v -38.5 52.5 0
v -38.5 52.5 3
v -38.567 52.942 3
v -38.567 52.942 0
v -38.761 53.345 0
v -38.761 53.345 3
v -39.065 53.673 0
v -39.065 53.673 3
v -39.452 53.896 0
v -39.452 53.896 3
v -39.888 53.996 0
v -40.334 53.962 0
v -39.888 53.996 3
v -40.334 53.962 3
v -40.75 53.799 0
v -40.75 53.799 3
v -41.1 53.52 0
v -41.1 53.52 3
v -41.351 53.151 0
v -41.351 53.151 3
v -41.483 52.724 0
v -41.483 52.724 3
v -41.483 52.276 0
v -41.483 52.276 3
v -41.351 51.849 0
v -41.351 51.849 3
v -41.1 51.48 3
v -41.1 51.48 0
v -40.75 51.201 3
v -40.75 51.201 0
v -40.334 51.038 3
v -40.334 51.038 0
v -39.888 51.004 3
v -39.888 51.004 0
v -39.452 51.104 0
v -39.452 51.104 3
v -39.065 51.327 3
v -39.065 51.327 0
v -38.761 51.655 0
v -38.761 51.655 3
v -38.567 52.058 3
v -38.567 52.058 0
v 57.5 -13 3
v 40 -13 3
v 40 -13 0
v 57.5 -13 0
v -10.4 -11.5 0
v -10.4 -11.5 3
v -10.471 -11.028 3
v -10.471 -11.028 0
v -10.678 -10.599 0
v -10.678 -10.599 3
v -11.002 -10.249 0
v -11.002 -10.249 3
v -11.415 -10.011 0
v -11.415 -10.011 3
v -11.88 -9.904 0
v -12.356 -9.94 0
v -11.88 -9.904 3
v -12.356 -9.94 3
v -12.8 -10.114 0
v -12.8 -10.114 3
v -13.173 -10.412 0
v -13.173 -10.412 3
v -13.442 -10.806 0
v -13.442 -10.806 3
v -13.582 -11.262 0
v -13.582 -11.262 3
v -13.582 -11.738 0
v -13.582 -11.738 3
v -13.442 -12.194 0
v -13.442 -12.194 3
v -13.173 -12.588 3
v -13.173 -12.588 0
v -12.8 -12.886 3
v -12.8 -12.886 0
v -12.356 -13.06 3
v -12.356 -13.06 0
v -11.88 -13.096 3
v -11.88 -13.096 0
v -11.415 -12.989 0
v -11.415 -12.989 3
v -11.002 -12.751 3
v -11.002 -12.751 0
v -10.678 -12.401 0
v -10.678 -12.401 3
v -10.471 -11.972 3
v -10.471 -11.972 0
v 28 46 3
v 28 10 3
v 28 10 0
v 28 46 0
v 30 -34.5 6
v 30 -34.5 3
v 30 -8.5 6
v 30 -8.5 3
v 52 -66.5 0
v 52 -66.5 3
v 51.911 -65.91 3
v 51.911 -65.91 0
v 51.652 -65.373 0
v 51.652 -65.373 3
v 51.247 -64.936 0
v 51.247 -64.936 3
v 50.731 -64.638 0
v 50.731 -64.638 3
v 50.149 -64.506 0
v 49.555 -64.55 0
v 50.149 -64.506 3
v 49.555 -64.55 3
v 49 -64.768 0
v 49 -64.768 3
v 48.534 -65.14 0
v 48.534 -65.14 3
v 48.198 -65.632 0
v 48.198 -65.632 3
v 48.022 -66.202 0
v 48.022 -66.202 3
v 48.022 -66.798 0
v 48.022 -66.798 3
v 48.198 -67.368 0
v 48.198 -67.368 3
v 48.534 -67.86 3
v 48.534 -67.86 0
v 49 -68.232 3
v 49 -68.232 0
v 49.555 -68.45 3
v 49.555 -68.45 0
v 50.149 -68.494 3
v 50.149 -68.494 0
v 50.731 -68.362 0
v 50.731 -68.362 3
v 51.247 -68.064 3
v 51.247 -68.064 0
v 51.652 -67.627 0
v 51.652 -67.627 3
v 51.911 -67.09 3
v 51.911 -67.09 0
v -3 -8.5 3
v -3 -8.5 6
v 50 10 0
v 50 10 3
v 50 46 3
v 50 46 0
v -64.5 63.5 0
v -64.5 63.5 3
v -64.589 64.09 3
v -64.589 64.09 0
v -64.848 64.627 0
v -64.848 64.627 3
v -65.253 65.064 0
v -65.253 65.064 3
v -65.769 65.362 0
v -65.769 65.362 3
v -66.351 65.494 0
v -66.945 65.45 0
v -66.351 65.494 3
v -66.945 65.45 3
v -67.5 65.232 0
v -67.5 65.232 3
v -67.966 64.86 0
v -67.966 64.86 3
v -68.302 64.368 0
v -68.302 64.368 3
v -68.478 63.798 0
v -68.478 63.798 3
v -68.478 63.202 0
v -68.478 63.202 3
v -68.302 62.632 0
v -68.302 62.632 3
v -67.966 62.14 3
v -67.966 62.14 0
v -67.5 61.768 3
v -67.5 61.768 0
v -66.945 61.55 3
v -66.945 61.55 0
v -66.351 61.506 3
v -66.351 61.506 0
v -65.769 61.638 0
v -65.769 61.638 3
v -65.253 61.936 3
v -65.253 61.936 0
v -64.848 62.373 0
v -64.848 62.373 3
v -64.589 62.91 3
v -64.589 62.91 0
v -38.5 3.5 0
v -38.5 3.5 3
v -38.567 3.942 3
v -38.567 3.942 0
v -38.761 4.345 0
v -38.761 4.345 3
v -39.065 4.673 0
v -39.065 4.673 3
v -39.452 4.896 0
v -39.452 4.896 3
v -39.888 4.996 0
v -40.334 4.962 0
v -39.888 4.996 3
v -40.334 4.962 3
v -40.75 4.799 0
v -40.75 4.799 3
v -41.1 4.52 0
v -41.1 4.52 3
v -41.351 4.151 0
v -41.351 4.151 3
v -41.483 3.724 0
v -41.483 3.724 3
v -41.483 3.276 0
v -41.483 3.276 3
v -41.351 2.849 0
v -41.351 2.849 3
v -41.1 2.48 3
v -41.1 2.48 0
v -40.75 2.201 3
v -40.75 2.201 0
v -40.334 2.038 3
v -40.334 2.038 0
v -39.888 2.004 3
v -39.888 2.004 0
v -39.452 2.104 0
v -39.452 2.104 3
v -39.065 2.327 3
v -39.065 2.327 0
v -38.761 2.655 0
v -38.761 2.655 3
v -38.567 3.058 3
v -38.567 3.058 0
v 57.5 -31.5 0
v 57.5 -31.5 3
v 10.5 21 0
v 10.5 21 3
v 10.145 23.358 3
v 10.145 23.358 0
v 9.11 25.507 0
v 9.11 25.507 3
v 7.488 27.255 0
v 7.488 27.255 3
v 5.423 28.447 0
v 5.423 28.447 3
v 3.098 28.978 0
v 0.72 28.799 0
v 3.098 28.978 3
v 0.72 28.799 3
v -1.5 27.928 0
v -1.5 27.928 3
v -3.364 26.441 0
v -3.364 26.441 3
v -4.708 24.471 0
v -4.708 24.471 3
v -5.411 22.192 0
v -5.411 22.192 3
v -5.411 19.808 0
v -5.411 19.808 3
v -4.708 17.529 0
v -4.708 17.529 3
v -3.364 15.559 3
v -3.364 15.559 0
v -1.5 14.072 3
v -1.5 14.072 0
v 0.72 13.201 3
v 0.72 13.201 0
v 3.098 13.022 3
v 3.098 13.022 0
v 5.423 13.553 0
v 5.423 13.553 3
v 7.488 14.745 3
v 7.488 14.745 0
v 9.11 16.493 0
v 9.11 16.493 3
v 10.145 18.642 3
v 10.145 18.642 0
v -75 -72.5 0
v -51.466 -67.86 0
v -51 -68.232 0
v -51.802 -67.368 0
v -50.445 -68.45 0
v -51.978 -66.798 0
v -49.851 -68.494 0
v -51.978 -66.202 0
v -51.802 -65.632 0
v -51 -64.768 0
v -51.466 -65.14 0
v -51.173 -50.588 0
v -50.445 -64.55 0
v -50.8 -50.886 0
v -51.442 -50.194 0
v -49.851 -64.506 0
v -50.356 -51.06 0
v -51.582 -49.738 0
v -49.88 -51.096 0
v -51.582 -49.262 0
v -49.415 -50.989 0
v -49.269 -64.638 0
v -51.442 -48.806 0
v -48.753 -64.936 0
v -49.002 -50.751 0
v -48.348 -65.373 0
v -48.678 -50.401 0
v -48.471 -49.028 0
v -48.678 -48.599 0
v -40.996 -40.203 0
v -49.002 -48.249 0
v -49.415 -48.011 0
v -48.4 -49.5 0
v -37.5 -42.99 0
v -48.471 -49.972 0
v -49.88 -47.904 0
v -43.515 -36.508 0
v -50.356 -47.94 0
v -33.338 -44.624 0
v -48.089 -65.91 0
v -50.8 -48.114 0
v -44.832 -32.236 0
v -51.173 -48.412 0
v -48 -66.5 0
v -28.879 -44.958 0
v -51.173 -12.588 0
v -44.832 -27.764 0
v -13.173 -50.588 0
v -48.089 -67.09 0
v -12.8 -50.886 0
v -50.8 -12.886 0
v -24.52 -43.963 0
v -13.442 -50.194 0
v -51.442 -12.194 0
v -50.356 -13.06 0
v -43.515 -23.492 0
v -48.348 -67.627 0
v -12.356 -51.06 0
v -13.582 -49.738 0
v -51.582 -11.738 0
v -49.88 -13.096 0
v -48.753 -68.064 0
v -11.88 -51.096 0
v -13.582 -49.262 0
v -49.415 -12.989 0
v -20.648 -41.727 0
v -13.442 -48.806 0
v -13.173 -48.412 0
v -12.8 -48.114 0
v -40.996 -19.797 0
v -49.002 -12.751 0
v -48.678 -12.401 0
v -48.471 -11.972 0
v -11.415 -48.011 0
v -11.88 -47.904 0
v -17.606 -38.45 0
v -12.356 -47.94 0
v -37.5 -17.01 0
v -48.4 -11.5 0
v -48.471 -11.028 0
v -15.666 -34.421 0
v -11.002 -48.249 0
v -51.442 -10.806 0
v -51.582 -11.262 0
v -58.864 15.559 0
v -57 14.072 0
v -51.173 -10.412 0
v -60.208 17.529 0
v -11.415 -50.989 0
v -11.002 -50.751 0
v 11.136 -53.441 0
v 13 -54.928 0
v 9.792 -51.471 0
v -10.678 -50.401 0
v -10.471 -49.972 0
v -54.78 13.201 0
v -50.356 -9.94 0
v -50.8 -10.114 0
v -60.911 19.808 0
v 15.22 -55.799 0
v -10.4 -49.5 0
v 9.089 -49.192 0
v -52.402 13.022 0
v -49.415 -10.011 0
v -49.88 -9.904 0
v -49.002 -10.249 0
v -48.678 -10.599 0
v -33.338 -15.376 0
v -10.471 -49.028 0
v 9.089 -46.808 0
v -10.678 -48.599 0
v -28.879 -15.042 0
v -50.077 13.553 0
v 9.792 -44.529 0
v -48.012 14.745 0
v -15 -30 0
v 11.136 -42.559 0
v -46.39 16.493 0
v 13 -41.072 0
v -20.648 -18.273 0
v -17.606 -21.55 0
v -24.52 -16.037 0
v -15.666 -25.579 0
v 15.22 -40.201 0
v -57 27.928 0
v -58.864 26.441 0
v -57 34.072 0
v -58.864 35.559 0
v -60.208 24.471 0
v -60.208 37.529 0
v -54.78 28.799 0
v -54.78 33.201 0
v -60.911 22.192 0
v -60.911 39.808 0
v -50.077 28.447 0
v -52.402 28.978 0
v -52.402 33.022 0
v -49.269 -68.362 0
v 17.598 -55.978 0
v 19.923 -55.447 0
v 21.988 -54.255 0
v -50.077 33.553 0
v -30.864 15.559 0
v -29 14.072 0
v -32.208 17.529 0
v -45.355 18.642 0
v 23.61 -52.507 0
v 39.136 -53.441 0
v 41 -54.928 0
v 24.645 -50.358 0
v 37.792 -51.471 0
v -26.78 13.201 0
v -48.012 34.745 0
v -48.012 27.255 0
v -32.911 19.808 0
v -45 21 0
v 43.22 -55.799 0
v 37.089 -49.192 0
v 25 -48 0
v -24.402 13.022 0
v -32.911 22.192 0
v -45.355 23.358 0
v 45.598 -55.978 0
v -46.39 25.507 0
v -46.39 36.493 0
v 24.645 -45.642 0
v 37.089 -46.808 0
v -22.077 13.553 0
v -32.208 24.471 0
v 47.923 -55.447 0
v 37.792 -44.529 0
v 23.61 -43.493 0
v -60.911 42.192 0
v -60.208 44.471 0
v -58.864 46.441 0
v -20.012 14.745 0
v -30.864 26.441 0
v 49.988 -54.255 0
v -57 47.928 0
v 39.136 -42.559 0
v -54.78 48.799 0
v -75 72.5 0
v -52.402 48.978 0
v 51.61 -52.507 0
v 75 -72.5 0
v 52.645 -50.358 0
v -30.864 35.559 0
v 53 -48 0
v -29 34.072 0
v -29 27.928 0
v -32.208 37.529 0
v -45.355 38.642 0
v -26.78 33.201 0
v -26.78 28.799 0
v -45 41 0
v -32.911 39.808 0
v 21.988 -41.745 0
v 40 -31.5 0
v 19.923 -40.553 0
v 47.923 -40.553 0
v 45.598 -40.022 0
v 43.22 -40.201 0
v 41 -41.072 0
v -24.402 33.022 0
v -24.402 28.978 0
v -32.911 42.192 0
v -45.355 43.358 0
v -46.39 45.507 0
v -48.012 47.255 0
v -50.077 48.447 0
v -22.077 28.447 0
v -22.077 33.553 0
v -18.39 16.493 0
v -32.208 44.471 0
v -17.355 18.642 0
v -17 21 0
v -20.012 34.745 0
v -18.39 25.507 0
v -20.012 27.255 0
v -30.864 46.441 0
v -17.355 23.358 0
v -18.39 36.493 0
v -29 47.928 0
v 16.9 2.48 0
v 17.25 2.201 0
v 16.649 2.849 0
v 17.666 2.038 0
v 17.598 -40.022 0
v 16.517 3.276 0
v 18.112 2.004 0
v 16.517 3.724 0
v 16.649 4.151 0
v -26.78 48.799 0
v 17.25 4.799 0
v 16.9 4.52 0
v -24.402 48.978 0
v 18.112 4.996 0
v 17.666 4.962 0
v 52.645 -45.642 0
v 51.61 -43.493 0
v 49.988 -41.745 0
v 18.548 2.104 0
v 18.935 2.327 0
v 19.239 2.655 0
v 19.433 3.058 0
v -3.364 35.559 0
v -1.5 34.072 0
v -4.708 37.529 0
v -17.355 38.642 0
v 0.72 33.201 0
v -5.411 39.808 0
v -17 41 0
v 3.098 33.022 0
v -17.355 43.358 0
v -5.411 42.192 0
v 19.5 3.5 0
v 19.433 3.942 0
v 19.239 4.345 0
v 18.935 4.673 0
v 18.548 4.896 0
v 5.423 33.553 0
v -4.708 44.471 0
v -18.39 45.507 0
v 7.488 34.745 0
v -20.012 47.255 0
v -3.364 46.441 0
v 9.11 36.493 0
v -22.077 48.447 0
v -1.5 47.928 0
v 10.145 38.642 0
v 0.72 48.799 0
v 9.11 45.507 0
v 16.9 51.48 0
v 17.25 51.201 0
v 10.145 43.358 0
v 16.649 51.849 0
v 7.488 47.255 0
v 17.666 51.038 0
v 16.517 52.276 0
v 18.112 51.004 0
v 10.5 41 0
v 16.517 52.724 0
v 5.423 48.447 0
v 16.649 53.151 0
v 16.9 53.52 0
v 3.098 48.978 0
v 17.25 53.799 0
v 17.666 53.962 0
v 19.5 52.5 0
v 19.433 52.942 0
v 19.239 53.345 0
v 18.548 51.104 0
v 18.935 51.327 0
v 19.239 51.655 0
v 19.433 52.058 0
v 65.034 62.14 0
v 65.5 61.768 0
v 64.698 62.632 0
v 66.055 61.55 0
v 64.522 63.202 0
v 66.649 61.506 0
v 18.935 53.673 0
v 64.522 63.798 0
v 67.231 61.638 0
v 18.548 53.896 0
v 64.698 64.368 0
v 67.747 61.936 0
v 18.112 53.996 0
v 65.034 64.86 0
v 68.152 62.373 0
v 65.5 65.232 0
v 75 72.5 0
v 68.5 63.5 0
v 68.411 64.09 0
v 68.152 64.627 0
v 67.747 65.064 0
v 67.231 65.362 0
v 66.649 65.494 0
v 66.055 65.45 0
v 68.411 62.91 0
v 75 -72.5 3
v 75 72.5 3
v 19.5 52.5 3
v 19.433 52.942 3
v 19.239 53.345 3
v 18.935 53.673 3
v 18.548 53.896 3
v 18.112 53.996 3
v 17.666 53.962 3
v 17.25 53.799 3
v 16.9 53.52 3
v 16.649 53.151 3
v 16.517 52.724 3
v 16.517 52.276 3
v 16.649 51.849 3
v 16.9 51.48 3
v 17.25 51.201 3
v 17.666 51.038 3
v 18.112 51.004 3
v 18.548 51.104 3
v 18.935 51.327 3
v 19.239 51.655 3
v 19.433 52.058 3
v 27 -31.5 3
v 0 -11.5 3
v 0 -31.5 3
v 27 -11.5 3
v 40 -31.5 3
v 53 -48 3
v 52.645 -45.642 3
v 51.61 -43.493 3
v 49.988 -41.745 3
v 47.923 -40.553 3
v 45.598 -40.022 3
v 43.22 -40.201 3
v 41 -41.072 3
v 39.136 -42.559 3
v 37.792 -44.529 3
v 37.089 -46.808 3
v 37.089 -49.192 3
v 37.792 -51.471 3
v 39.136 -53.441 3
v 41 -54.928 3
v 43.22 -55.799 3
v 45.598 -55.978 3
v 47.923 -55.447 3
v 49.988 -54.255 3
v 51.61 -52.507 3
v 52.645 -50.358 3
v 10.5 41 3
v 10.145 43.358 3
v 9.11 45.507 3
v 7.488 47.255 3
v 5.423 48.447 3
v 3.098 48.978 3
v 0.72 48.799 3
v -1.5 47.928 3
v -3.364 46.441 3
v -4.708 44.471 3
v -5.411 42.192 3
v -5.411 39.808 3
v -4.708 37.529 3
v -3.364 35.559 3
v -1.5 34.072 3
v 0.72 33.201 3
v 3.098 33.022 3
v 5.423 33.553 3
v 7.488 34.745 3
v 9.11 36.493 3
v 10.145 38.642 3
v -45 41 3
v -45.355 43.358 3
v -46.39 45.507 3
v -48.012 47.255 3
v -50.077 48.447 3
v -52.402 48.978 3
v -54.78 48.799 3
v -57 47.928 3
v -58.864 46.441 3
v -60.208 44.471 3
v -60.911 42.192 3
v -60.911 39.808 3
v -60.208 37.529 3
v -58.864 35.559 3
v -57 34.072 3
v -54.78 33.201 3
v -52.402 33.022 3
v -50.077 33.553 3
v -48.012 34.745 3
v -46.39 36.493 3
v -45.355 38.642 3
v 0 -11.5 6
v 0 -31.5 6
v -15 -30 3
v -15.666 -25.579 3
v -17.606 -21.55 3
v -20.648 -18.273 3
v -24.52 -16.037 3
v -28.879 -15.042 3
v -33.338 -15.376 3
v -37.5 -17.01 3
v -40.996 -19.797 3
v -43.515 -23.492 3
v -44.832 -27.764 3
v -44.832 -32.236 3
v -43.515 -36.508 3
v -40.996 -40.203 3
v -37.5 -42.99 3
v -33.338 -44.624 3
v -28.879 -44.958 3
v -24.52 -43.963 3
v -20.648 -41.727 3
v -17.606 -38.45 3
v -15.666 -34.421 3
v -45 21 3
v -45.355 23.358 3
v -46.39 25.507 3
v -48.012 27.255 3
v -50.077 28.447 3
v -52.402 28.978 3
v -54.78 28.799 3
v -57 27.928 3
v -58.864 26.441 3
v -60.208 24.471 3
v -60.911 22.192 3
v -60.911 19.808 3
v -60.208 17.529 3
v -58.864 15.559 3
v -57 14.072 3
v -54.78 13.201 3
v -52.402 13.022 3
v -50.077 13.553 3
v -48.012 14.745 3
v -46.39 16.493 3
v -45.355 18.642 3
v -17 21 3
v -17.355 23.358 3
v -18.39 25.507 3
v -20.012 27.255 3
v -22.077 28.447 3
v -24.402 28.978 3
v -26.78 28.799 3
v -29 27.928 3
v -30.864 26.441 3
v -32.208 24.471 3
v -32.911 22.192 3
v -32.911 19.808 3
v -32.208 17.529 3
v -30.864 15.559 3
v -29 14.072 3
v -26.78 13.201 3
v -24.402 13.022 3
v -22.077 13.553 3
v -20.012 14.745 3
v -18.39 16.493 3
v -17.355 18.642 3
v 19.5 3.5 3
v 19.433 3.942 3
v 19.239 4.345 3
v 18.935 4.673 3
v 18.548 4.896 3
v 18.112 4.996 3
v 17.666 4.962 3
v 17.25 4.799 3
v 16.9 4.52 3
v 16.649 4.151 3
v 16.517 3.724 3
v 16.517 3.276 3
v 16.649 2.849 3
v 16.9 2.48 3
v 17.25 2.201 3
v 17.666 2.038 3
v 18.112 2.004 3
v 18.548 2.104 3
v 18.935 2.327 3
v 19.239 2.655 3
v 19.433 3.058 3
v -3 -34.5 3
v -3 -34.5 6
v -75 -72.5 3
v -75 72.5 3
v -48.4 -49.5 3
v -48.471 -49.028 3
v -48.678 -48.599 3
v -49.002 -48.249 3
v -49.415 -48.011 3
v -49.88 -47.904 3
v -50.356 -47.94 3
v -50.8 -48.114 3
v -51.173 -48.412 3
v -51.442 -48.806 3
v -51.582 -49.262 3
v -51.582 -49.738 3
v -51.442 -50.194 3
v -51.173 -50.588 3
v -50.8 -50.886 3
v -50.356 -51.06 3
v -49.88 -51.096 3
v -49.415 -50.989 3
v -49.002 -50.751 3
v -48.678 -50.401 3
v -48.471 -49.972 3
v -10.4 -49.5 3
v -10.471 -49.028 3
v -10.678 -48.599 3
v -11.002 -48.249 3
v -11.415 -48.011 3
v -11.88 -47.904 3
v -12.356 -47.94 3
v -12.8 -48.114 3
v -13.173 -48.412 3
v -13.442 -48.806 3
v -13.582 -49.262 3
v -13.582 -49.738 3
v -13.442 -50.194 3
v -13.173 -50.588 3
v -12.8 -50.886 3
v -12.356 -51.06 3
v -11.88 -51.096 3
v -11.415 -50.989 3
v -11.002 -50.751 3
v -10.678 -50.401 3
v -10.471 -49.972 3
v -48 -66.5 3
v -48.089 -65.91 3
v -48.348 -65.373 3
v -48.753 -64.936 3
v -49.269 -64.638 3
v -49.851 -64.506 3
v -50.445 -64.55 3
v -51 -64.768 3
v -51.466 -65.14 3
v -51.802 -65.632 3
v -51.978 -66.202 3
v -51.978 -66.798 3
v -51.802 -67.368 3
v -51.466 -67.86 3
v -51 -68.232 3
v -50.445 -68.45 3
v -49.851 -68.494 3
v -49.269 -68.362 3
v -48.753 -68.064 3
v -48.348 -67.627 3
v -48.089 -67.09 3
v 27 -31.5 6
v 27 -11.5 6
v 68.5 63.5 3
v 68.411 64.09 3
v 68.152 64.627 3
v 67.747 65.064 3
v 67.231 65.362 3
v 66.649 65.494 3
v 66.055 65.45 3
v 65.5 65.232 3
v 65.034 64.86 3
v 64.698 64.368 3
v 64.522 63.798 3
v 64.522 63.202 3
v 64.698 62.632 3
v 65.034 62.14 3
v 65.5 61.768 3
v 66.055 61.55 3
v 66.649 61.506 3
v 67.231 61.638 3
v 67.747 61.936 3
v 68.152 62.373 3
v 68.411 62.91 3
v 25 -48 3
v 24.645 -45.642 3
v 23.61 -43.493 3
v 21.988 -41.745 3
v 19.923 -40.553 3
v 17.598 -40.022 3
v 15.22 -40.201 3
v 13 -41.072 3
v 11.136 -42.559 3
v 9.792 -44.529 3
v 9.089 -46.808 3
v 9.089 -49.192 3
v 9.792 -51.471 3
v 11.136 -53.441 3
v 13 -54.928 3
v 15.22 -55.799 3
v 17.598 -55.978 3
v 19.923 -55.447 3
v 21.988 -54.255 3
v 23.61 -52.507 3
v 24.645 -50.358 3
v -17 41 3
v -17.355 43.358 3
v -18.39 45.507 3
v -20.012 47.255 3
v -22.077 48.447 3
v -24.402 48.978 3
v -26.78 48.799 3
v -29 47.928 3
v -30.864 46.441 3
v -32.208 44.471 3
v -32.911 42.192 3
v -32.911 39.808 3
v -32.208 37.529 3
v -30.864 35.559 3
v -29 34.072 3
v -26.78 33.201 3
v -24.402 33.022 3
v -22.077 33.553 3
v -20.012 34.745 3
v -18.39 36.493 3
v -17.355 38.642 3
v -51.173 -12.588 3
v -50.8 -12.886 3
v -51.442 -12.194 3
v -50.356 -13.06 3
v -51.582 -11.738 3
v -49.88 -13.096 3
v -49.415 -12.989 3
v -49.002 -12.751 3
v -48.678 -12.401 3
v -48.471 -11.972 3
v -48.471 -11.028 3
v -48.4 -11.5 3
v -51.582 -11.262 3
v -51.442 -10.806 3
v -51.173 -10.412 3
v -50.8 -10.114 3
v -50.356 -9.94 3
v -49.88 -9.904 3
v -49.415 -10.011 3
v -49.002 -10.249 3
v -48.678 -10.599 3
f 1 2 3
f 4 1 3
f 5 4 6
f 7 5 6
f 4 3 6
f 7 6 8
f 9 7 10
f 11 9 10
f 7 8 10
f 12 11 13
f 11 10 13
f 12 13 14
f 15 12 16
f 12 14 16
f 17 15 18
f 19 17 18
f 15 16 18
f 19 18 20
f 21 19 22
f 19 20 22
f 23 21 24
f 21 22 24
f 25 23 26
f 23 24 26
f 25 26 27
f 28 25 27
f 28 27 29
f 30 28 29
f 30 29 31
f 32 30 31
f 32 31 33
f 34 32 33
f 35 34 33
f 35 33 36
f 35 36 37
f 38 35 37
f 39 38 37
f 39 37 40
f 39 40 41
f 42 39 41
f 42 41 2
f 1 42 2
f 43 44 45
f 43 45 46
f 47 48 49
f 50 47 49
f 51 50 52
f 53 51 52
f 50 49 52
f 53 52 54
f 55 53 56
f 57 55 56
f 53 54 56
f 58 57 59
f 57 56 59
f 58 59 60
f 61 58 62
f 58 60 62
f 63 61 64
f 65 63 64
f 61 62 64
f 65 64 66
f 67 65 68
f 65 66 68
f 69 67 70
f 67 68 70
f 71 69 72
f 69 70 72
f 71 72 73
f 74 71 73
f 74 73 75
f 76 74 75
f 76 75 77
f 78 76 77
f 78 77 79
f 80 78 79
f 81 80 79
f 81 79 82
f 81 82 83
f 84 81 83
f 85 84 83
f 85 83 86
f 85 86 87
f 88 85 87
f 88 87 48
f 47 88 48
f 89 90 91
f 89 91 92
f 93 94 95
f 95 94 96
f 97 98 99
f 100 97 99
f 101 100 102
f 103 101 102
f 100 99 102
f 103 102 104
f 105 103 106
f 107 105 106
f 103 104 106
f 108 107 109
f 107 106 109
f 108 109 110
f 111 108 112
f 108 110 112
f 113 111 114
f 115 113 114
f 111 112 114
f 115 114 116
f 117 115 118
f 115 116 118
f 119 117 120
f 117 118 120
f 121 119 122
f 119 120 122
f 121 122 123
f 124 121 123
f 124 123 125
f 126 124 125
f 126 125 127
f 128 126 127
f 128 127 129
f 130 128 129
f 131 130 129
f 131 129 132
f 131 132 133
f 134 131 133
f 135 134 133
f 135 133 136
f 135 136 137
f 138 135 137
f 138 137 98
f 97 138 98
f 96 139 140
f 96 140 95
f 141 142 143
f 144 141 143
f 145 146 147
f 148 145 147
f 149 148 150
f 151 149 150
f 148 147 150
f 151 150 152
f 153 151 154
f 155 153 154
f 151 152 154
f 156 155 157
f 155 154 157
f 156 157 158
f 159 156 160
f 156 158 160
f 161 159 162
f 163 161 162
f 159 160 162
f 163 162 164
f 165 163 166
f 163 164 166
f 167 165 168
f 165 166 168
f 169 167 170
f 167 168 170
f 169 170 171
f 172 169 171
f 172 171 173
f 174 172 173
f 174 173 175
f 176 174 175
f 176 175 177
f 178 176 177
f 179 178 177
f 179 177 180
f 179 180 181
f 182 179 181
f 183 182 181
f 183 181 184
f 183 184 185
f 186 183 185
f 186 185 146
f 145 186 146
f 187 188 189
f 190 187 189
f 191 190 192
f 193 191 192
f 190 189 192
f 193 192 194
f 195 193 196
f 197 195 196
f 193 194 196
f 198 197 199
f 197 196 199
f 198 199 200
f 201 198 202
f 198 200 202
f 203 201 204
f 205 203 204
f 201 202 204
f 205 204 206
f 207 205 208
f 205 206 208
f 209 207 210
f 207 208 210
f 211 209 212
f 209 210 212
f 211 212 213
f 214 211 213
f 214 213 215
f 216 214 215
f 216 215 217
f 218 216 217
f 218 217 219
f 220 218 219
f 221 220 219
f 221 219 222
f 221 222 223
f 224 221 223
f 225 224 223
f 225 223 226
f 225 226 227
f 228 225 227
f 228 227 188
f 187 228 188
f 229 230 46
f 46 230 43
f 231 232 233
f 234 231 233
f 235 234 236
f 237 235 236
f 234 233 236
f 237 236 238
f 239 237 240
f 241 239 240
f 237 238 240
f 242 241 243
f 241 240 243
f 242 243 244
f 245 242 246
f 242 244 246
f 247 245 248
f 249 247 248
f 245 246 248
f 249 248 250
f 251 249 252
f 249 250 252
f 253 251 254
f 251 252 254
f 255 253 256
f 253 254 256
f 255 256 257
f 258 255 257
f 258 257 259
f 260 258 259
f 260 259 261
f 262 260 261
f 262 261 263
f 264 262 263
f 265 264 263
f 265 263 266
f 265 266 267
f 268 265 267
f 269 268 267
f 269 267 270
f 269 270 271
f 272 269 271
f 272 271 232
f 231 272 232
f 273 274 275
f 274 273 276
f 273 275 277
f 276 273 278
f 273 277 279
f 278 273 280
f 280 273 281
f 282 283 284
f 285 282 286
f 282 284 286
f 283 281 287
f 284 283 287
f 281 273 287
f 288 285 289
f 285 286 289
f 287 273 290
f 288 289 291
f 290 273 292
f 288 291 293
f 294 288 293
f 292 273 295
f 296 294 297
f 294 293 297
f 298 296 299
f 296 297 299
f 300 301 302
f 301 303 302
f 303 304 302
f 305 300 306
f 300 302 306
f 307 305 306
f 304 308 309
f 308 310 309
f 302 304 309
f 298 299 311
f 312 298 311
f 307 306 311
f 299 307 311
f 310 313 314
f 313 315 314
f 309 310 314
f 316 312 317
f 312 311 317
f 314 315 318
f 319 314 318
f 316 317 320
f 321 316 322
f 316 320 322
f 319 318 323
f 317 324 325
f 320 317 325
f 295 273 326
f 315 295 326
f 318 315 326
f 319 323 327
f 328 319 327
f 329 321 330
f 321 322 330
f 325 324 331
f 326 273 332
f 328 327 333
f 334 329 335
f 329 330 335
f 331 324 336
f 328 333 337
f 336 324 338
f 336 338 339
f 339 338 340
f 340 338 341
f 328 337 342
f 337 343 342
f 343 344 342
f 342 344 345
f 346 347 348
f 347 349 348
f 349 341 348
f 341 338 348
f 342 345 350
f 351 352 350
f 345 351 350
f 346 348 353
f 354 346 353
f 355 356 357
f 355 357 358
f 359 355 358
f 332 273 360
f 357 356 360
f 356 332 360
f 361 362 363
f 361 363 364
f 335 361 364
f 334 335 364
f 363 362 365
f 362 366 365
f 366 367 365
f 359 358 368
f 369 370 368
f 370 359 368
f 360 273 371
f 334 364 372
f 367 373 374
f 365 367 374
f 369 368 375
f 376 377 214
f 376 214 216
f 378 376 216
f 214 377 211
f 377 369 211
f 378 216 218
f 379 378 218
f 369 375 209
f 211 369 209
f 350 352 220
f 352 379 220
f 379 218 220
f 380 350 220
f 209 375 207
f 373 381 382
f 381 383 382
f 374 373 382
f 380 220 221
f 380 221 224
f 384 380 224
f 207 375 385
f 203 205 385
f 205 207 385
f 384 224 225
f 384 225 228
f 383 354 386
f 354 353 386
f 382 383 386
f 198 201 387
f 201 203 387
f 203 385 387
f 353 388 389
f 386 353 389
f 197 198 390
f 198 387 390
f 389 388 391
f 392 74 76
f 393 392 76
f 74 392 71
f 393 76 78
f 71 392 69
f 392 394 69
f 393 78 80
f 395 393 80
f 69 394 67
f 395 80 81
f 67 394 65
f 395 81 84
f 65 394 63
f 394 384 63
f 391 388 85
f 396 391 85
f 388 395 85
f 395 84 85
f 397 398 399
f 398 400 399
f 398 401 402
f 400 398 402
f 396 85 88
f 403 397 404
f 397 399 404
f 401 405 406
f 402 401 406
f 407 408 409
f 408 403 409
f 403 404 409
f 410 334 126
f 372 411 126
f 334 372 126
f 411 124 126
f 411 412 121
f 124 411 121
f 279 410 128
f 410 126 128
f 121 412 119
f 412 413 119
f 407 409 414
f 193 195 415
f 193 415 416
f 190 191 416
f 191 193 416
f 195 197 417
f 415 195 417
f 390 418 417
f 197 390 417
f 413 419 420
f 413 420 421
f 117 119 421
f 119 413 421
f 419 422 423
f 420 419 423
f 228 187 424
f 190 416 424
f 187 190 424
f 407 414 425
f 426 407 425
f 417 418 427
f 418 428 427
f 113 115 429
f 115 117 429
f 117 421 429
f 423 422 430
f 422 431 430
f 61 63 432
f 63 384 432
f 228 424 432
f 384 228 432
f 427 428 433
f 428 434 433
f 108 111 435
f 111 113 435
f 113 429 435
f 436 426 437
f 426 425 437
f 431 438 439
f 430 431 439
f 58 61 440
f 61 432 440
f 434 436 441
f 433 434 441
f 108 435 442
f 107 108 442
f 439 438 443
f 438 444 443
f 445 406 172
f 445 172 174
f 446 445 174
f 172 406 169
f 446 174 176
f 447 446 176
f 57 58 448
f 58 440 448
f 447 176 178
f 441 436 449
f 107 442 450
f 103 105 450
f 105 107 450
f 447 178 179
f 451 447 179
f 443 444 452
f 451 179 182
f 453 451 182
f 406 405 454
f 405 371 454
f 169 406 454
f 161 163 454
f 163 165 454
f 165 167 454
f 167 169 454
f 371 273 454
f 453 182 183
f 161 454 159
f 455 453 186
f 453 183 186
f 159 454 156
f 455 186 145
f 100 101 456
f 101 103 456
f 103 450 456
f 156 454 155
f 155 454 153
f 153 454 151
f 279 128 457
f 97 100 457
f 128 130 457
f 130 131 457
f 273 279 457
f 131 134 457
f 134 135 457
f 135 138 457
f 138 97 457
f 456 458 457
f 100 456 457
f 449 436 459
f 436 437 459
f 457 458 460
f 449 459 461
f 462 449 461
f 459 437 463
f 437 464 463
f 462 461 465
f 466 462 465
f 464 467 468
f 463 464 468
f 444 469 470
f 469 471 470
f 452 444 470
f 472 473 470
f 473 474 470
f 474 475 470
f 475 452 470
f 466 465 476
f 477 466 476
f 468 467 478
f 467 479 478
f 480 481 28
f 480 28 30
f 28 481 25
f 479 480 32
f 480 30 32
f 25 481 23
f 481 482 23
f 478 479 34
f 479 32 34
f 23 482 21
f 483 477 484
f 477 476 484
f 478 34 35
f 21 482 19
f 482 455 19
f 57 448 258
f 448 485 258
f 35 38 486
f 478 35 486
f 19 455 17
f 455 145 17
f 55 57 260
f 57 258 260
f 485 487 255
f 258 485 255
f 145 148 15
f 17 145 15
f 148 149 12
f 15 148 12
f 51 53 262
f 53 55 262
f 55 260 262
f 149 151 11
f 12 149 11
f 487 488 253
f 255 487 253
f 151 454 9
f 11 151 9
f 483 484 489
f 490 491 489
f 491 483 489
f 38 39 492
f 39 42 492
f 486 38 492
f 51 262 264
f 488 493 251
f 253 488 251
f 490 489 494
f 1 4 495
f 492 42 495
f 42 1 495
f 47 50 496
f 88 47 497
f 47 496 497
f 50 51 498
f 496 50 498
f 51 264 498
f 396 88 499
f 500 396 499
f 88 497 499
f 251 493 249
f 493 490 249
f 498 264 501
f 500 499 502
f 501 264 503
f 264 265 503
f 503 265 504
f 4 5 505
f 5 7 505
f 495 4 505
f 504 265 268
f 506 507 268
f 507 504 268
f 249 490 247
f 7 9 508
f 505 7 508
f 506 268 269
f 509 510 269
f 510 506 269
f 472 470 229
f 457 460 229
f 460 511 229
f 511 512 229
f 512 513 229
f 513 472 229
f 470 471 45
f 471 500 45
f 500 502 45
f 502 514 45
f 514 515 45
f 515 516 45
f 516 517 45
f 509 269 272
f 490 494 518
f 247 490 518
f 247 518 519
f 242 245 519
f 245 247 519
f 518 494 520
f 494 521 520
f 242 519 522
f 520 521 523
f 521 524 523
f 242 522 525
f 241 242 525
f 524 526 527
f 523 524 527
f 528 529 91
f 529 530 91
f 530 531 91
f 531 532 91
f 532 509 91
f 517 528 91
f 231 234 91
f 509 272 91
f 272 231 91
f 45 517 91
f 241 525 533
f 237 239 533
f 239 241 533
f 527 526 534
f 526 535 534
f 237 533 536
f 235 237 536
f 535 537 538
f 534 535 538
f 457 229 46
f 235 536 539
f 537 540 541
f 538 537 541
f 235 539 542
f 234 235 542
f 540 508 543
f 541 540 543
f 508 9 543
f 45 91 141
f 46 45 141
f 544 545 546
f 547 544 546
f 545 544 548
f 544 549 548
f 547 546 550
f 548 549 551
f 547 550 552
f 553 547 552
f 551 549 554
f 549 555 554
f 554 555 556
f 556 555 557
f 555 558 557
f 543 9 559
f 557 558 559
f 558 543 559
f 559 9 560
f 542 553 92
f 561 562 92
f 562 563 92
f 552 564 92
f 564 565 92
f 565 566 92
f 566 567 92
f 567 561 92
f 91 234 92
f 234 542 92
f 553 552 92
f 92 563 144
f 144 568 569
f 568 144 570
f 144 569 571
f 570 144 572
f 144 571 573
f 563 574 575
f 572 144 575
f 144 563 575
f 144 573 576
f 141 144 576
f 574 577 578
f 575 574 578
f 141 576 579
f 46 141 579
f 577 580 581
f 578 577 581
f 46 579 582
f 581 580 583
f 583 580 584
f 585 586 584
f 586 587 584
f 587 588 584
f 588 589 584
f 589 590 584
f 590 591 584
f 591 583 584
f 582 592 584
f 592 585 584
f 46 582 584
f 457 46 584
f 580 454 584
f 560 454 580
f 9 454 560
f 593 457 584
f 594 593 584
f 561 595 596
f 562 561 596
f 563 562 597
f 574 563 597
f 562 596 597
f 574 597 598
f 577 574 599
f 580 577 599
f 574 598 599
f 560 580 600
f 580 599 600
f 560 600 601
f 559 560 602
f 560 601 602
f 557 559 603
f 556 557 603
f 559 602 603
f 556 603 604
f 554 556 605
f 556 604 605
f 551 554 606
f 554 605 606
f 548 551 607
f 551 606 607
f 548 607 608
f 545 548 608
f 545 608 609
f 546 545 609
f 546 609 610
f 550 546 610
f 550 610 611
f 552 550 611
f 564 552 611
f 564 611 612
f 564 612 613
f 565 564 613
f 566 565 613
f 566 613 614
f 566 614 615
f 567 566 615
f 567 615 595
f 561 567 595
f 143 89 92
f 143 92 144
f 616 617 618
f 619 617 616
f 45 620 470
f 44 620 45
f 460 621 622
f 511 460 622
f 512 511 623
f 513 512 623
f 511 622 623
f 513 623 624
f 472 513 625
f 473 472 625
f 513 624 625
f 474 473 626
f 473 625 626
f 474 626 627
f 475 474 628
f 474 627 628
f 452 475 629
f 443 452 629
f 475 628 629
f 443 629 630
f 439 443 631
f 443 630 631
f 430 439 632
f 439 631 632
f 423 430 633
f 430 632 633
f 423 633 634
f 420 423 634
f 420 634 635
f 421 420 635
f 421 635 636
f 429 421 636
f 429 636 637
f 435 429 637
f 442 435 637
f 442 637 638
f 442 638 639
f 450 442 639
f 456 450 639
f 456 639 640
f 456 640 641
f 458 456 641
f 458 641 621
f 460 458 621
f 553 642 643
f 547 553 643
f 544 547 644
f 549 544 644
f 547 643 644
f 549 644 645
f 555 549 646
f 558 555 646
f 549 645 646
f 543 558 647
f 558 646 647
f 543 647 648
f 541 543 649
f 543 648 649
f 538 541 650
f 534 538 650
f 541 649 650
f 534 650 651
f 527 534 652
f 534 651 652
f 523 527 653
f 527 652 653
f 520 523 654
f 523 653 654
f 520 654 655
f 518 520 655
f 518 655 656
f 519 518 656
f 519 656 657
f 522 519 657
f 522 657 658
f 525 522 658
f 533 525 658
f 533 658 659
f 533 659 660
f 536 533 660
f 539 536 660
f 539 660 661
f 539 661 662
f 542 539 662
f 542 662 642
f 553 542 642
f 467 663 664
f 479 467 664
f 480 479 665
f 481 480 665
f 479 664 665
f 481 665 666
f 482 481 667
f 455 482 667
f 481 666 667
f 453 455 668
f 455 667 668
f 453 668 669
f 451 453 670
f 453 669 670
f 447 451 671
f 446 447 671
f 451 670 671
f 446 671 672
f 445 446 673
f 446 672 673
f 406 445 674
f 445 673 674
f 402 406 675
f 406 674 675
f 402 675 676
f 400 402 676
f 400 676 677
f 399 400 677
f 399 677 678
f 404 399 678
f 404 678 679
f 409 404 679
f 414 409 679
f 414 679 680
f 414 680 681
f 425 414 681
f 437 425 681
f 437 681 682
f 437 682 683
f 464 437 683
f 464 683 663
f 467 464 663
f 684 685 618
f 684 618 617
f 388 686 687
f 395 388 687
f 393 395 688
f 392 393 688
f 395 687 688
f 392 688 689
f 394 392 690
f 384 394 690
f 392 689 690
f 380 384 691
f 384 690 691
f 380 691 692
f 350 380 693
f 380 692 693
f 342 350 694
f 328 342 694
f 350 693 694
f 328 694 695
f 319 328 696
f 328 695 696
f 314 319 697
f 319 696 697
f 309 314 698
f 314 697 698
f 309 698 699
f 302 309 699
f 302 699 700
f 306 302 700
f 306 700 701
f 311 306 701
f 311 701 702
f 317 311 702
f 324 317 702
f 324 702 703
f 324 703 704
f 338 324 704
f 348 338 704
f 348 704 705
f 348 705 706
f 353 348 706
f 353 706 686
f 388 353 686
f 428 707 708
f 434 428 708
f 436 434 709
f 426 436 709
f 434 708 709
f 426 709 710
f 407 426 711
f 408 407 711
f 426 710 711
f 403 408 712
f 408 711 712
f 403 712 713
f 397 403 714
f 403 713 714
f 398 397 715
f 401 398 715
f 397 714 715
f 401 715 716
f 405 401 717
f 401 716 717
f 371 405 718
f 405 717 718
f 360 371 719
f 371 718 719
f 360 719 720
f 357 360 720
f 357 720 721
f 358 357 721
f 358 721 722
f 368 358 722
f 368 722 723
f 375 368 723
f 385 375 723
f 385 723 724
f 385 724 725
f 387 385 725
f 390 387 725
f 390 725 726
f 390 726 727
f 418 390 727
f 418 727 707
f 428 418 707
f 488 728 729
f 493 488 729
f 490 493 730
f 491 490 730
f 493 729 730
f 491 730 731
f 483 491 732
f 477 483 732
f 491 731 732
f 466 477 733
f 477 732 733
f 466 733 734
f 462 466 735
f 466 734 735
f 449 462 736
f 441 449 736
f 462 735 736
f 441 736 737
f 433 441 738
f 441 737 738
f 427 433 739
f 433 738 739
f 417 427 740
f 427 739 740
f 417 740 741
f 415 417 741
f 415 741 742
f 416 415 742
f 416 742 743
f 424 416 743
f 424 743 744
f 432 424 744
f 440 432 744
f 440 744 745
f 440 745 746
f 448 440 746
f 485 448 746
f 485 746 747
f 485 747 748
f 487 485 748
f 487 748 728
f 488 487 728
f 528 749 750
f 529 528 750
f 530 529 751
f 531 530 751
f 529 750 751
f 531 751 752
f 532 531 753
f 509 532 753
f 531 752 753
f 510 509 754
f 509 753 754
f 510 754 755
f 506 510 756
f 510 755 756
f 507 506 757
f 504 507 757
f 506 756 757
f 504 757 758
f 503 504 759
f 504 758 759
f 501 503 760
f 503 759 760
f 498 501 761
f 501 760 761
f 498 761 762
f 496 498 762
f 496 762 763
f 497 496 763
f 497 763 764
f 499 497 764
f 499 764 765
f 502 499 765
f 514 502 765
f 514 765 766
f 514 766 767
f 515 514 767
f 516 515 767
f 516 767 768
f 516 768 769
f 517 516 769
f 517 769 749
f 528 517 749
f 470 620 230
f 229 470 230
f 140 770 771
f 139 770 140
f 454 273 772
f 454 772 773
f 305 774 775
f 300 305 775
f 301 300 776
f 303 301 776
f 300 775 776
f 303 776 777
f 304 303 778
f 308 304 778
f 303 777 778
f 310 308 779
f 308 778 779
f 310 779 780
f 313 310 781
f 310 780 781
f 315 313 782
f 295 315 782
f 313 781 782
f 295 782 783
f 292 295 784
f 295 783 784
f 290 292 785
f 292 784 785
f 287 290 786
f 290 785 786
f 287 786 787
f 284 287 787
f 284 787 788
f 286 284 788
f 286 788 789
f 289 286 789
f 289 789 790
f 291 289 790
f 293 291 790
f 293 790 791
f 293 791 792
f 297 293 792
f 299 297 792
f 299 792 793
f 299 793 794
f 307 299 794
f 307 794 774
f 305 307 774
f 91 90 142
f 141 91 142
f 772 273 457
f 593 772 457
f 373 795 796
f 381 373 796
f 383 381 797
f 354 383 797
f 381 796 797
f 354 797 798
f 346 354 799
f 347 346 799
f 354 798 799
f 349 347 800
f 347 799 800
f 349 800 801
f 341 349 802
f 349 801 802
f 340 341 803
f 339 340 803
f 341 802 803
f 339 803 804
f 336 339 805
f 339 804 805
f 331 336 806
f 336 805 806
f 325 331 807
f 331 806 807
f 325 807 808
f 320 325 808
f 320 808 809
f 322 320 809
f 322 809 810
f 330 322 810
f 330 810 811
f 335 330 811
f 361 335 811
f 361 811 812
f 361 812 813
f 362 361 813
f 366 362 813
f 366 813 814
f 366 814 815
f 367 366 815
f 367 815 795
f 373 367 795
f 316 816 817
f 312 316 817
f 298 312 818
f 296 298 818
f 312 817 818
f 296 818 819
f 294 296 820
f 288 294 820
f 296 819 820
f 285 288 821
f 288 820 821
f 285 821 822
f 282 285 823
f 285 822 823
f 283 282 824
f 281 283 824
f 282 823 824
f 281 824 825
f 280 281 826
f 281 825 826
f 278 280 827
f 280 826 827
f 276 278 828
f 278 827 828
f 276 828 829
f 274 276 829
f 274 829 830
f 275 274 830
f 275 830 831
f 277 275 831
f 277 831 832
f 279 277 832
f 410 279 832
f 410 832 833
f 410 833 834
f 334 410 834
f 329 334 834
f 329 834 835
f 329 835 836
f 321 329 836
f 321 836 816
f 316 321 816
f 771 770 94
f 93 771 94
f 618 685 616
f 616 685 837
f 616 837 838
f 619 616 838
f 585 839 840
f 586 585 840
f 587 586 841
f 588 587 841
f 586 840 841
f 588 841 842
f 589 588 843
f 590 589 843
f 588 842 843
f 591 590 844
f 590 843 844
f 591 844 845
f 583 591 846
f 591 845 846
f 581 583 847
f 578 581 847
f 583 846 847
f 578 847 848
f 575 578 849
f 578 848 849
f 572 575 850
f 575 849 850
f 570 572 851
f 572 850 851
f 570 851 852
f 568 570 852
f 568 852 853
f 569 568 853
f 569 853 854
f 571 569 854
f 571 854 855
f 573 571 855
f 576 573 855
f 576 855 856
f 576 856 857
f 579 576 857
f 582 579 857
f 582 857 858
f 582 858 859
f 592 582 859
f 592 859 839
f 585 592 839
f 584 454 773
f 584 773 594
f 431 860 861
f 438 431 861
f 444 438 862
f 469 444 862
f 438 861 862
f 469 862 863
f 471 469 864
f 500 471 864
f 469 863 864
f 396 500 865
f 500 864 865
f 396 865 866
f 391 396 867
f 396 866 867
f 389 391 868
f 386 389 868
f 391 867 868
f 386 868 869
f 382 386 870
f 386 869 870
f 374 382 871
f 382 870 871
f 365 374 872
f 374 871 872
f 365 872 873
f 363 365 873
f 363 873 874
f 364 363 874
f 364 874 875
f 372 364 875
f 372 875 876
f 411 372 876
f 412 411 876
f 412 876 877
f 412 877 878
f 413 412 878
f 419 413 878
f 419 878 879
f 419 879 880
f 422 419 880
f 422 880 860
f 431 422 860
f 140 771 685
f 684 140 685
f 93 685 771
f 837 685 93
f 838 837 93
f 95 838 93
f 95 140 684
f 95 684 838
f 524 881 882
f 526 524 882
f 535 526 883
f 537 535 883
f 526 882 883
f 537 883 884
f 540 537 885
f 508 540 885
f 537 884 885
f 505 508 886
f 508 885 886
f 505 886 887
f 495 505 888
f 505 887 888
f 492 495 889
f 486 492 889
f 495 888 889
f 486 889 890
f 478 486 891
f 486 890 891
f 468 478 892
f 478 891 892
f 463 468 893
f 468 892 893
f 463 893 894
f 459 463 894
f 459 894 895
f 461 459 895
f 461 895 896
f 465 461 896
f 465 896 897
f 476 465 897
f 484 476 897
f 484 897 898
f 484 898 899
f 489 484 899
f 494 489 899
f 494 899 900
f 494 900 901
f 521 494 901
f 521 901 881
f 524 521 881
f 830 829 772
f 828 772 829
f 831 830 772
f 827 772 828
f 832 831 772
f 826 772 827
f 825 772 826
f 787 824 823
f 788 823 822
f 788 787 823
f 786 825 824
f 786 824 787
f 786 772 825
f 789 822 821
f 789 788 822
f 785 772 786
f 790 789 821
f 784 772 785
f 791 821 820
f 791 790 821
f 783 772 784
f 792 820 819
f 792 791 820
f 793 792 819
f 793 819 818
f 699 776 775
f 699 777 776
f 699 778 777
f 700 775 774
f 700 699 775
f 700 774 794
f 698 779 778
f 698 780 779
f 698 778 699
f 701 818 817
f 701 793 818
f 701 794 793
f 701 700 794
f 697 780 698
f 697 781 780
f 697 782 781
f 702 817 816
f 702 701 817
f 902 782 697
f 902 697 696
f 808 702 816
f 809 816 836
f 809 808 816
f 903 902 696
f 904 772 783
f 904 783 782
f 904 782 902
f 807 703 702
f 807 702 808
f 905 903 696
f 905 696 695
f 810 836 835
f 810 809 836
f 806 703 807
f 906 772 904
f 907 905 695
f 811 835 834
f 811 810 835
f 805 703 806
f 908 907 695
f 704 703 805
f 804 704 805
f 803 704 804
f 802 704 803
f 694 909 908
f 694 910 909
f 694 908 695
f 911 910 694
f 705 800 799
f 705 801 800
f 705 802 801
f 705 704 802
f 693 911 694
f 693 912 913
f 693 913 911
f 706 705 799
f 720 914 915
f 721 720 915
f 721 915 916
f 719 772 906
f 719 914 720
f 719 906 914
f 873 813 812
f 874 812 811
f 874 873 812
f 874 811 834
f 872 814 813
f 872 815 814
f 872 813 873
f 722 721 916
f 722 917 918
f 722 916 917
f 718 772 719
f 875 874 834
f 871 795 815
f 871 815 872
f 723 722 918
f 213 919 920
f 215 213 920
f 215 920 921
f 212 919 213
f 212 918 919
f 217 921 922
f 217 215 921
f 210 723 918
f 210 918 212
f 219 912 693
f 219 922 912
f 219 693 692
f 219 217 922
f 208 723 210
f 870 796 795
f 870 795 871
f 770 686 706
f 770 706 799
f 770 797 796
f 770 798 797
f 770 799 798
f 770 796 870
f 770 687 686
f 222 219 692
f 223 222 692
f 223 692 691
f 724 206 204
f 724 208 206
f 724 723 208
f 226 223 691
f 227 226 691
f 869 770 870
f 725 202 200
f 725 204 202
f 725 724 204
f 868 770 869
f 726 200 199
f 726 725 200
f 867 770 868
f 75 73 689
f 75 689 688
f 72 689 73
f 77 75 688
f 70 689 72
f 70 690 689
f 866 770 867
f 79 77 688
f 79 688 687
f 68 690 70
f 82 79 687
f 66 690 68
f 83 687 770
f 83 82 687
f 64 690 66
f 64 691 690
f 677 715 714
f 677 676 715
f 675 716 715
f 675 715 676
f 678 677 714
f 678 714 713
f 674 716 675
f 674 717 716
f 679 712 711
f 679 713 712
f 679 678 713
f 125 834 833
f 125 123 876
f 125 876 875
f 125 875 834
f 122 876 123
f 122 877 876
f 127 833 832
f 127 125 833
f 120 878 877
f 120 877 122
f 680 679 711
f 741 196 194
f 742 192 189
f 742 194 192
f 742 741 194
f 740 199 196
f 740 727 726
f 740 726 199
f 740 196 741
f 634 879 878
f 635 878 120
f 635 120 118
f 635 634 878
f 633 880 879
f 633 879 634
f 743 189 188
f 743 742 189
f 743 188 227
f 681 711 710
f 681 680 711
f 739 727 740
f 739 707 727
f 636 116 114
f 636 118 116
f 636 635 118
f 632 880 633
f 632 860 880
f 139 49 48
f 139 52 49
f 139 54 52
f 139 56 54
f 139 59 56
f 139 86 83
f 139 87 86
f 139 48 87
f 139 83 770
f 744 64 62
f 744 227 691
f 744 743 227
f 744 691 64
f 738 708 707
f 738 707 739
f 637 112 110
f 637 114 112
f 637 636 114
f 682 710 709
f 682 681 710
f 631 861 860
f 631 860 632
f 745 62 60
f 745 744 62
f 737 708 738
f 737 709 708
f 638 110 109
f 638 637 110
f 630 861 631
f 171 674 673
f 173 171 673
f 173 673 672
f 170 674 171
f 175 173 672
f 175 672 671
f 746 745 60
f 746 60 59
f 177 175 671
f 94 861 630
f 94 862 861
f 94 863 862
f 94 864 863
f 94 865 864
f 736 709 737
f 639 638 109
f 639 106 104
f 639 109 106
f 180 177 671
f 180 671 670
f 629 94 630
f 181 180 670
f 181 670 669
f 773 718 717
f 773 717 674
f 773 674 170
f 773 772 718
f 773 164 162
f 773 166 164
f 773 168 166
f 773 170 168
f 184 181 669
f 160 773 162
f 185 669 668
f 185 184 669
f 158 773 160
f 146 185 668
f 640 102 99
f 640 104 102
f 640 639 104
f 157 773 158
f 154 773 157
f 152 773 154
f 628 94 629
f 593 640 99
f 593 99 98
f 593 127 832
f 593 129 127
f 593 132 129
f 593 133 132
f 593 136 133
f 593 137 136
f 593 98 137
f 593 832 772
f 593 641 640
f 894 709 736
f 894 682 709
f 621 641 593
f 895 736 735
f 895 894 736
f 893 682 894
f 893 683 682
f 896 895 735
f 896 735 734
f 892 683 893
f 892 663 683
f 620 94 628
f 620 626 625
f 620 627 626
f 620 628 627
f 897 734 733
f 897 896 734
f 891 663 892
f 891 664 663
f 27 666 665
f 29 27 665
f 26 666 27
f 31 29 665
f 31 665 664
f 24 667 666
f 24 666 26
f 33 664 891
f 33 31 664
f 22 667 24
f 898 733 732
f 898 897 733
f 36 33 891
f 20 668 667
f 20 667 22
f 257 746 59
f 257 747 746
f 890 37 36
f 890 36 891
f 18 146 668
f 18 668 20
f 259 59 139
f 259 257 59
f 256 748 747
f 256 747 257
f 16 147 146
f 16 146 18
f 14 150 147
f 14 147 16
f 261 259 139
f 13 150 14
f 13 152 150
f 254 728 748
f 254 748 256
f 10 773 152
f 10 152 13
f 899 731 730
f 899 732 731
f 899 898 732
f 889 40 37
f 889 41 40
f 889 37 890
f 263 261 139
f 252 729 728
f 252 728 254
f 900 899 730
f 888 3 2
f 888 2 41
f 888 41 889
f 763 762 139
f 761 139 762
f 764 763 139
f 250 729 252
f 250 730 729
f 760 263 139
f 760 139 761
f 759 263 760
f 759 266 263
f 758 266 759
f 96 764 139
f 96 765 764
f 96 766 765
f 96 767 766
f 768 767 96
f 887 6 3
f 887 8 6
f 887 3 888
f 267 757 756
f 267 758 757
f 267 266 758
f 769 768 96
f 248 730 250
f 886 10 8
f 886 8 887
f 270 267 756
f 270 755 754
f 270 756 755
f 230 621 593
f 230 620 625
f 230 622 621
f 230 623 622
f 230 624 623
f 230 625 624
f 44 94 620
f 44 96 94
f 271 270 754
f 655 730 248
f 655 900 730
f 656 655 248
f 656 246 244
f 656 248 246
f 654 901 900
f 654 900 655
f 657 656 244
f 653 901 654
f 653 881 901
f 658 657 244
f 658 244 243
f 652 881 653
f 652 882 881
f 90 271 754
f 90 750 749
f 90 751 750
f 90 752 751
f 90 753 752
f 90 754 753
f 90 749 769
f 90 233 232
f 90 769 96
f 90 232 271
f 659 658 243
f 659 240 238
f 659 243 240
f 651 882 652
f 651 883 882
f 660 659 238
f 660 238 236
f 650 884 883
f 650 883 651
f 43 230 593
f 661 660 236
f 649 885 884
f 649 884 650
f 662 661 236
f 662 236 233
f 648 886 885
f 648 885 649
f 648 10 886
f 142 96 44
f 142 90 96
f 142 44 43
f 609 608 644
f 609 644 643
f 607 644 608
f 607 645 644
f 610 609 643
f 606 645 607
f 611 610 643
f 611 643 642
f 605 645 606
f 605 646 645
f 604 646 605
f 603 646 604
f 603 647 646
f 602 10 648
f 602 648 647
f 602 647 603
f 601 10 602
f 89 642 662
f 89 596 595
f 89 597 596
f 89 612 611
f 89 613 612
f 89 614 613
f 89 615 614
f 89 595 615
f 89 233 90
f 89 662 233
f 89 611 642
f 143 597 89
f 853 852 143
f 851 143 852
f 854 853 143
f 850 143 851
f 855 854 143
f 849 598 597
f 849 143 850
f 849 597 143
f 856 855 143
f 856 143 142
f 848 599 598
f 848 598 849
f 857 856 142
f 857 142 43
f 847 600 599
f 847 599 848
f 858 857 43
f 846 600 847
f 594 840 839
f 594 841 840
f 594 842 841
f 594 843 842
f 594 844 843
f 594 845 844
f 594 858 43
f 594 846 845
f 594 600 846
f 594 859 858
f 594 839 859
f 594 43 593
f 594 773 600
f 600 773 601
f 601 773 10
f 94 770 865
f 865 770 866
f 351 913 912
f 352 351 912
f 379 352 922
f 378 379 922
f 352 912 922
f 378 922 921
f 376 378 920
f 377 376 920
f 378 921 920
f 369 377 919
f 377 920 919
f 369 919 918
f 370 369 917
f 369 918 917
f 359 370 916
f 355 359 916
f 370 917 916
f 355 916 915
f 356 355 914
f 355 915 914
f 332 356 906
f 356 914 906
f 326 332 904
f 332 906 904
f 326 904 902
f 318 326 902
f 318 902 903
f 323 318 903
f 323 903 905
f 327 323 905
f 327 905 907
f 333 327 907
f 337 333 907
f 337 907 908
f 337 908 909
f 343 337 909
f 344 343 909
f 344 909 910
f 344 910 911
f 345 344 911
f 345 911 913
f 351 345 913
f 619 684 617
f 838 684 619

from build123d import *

# Parameters (mm, degrees)
SKETCH_W        = 150
SKETCH_H        = 145
PAD_DEPTH       = 3
SKETCH001_R     = 2
POCKET_DEPTH    = 5
SKETCH002_R     = 1.5
POCKET001_DEPTH = 3.001
SKETCH003_R     = 1.6
POCKET002_DEPTH = 3.001
SKETCH004_W     = 33
SKETCH004_H     = 26
PAD001_DEPTH    = 3
SKETCH005_W     = 27
SKETCH005_H     = 20
POCKET003_DEPTH = 3
SKETCH006_R     = 8
SKETCH006_R_2   = 15
SKETCH006_W     = 22
SKETCH006_H     = 36
SKETCH006_W_2   = 17.5
SKETCH006_H_2   = 18.5
POCKET004_DEPTH = 3.001


with BuildPart() as part:
    # Sketch → Pad (new body)
    with BuildSketch(Plane.XY):
        Rectangle(SKETCH_W, SKETCH_H)
    extrude(amount=PAD_DEPTH)

    # Sketch001 (on Face6 of Pad) → Pocket (cut)
    with BuildSketch(Plane.XY.offset(3)):
        with Locations((-50, -66.5)):
            Circle(SKETCH001_R)
        with Locations((50, -66.5)):
            Circle(SKETCH001_R)
        with Locations((-66.5, 63.5)):
            Circle(SKETCH001_R)
        with Locations((66.5, 63.5)):
            Circle(SKETCH001_R)
    extrude(amount=-POCKET_DEPTH, mode=Mode.SUBTRACT)

    # Sketch002 (on Face5 of Pocket) → Pocket001 (cut, through all)
    with BuildSketch(Plane.XY.offset(3)):
        with Locations((-40, 52.5)):
            Circle(SKETCH002_R)
        with Locations((18, 52.5)):
            Circle(SKETCH002_R)
        with Locations((-40, 3.5)):
            Circle(SKETCH002_R)
        with Locations((18, 3.5)):
            Circle(SKETCH002_R)
    extrude(amount=-POCKET001_DEPTH, mode=Mode.SUBTRACT)

    # Sketch003 (on Face5 of Pocket001) → Pocket002 (cut, through all)
    with BuildSketch(Plane.XY.offset(3)):
        with Locations((-50, -11.5)):
            Circle(SKETCH003_R)
        with Locations((-12, -11.5)):
            Circle(SKETCH003_R)
        with Locations((-50, -49.5)):
            Circle(SKETCH003_R)
        with Locations((-12, -49.5)):
            Circle(SKETCH003_R)
    extrude(amount=-POCKET002_DEPTH, mode=Mode.SUBTRACT)

    # Sketch004 (on Face5 of Pocket002) → Pad001 (join)
    with BuildSketch(Plane.XY.offset(3)):
        with Locations((13.5, -21.5)):
            Rectangle(SKETCH004_W, SKETCH004_H)
    extrude(amount=PAD001_DEPTH)

    # Sketch005 (on Face23 of Pad001) → Pocket003 (cut)
    with BuildSketch(Plane.XY.offset(6)):
        with Locations((13.5, -21.5)):
            Rectangle(SKETCH005_W, SKETCH005_H)
    extrude(amount=-POCKET003_DEPTH, mode=Mode.SUBTRACT)

    # Sketch006 (on Face5 of Pocket003) → Pocket004 (cut, through all)
    with BuildSketch(Plane.XY.offset(3)):
        with Locations((-25, 41)):
            Circle(SKETCH006_R)
        with Locations((2.5, 41)):
            Circle(SKETCH006_R)
        with Locations((-25, 21)):
            Circle(SKETCH006_R)
        with Locations((2.5, 21)):
            Circle(SKETCH006_R)
        with Locations((-30, -30)):
            Circle(SKETCH006_R_2)
        with Locations((17, -48)):
            Circle(SKETCH006_R)
        with Locations((45, -48)):
            Circle(SKETCH006_R)
        with Locations((-53, 41)):
            Circle(SKETCH006_R)
        with Locations((-53, 21)):
            Circle(SKETCH006_R)
        with Locations((39, 28)):
            Rectangle(SKETCH006_W, SKETCH006_H)
        with Locations((48.75, -22.25)):
            Rectangle(SKETCH006_W_2, SKETCH006_H_2)
    extrude(amount=-POCKET004_DEPTH, mode=Mode.SUBTRACT)


solid = part.part
